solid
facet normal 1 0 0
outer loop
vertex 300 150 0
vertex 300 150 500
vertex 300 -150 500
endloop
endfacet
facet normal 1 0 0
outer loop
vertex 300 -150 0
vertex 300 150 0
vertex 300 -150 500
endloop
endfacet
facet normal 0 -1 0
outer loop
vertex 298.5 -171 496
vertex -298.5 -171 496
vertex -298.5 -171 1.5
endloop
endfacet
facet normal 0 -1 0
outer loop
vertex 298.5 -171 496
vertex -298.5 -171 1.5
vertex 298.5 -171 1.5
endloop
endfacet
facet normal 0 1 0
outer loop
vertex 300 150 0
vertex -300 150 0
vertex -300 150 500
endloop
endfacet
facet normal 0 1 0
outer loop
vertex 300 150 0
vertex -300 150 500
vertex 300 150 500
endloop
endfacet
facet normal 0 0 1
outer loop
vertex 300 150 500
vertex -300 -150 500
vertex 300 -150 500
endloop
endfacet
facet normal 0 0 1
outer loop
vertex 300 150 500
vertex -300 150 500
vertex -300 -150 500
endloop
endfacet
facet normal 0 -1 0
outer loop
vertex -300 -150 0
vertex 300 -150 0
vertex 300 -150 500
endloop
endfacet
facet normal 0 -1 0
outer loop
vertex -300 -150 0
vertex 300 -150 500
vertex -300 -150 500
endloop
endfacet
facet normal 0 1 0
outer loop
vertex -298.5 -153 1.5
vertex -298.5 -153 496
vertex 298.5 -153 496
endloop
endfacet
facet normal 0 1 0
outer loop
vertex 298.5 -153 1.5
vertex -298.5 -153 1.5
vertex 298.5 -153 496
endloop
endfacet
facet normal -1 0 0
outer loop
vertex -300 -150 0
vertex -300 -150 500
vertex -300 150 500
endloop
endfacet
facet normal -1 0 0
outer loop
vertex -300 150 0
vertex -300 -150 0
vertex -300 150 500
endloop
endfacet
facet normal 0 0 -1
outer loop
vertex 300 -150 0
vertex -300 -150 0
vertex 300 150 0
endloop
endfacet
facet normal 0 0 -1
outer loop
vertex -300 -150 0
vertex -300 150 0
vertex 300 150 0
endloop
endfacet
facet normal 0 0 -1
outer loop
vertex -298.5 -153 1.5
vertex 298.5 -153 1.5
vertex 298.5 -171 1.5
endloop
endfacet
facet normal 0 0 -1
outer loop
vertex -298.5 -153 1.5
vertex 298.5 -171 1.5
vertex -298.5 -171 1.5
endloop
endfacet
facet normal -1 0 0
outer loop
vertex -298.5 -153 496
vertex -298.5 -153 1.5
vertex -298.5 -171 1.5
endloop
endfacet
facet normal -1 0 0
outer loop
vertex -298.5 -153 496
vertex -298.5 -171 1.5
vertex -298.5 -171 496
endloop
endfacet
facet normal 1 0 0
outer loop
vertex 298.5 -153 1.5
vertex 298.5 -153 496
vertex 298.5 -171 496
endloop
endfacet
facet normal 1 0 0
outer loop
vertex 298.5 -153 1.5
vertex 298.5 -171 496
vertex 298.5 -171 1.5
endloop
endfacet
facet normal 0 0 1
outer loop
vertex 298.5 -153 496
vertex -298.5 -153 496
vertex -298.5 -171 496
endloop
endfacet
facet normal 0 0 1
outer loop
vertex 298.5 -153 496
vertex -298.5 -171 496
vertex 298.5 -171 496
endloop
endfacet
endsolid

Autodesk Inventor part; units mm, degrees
ref_plane "YZ Plane" through (0, 0, 0) normal (1, 0, 0) x (0, 1, 0)
ref_plane "XZ Plane" through (0, 0, 0) normal (0, 1, 0) x (-1, 0, 0)
ref_plane "XY Plane" through (0, 0, 0) normal (0, 0, 1) x (1, 0, 0)
sketch "Sketch1" plane through (0, 0, 0) normal (0, 0, 1) x (1, 0, 0)
  line L0 (-300, 150) -> (300, 150)
  line L1 (300, 150) -> (300, -150)
  line L2 (300, -150) -> (-300, -150)
  line L3 (-300, -150) -> (-300, 150)
  line L4 (-300, 150) -> (300, -150) construction
  line L5 (300, 150) -> (-300, -150) construction
  point P0 (0, 0)
  dimension "Width" = 600
  dimension "Depth" = 300
extrude "Extrusion1" add sketch "Sketch1" along normal blind 500
sketch "Sketch7" plane through (-300, -150, 0) normal (0, -1, 0) x (1, 0, 0)
  line L0 (600, 0) -> (0, 0) construction
  line L1 (600, 0) -> (600, 500) construction
  line L2 (0, 500) -> (600, 500) construction
  line L3 (0, 0) -> (0, 500) construction
  line L4 (1.5, 496) -> (598.5, 496)
  line L5 (598.5, 496) -> (598.5, 1.5)
  line L6 (598.5, 1.5) -> (1.5, 1.5)
  line L7 (1.5, 1.5) -> (1.5, 496)
  line L8 (600, 0) -> (0, 0)
  point P0 (300, 0)
  dimension "Offset_From_Top" = 4
  dimension "Offset_From_Right" = 1.5
  dimension "Offset_From_Left" = 1.5
  dimension "Offset_From_Bottom" = 1.5
extrude "Extrusion7" add sketch "Sketch7" along normal blind 18 separate body
move or copy body "Move2" bodies to move or copy 2 copy no translate (0, -3, 0)
move or copy body "Move3" bodies to move or copy 2 copy no translate (0, 0.0001, 0)
equation "\"d37\" = Panel_thickness"
equation "\"Panel_thickness\" = 18"
properties part number "Horizontaly opening Door skeleton"
